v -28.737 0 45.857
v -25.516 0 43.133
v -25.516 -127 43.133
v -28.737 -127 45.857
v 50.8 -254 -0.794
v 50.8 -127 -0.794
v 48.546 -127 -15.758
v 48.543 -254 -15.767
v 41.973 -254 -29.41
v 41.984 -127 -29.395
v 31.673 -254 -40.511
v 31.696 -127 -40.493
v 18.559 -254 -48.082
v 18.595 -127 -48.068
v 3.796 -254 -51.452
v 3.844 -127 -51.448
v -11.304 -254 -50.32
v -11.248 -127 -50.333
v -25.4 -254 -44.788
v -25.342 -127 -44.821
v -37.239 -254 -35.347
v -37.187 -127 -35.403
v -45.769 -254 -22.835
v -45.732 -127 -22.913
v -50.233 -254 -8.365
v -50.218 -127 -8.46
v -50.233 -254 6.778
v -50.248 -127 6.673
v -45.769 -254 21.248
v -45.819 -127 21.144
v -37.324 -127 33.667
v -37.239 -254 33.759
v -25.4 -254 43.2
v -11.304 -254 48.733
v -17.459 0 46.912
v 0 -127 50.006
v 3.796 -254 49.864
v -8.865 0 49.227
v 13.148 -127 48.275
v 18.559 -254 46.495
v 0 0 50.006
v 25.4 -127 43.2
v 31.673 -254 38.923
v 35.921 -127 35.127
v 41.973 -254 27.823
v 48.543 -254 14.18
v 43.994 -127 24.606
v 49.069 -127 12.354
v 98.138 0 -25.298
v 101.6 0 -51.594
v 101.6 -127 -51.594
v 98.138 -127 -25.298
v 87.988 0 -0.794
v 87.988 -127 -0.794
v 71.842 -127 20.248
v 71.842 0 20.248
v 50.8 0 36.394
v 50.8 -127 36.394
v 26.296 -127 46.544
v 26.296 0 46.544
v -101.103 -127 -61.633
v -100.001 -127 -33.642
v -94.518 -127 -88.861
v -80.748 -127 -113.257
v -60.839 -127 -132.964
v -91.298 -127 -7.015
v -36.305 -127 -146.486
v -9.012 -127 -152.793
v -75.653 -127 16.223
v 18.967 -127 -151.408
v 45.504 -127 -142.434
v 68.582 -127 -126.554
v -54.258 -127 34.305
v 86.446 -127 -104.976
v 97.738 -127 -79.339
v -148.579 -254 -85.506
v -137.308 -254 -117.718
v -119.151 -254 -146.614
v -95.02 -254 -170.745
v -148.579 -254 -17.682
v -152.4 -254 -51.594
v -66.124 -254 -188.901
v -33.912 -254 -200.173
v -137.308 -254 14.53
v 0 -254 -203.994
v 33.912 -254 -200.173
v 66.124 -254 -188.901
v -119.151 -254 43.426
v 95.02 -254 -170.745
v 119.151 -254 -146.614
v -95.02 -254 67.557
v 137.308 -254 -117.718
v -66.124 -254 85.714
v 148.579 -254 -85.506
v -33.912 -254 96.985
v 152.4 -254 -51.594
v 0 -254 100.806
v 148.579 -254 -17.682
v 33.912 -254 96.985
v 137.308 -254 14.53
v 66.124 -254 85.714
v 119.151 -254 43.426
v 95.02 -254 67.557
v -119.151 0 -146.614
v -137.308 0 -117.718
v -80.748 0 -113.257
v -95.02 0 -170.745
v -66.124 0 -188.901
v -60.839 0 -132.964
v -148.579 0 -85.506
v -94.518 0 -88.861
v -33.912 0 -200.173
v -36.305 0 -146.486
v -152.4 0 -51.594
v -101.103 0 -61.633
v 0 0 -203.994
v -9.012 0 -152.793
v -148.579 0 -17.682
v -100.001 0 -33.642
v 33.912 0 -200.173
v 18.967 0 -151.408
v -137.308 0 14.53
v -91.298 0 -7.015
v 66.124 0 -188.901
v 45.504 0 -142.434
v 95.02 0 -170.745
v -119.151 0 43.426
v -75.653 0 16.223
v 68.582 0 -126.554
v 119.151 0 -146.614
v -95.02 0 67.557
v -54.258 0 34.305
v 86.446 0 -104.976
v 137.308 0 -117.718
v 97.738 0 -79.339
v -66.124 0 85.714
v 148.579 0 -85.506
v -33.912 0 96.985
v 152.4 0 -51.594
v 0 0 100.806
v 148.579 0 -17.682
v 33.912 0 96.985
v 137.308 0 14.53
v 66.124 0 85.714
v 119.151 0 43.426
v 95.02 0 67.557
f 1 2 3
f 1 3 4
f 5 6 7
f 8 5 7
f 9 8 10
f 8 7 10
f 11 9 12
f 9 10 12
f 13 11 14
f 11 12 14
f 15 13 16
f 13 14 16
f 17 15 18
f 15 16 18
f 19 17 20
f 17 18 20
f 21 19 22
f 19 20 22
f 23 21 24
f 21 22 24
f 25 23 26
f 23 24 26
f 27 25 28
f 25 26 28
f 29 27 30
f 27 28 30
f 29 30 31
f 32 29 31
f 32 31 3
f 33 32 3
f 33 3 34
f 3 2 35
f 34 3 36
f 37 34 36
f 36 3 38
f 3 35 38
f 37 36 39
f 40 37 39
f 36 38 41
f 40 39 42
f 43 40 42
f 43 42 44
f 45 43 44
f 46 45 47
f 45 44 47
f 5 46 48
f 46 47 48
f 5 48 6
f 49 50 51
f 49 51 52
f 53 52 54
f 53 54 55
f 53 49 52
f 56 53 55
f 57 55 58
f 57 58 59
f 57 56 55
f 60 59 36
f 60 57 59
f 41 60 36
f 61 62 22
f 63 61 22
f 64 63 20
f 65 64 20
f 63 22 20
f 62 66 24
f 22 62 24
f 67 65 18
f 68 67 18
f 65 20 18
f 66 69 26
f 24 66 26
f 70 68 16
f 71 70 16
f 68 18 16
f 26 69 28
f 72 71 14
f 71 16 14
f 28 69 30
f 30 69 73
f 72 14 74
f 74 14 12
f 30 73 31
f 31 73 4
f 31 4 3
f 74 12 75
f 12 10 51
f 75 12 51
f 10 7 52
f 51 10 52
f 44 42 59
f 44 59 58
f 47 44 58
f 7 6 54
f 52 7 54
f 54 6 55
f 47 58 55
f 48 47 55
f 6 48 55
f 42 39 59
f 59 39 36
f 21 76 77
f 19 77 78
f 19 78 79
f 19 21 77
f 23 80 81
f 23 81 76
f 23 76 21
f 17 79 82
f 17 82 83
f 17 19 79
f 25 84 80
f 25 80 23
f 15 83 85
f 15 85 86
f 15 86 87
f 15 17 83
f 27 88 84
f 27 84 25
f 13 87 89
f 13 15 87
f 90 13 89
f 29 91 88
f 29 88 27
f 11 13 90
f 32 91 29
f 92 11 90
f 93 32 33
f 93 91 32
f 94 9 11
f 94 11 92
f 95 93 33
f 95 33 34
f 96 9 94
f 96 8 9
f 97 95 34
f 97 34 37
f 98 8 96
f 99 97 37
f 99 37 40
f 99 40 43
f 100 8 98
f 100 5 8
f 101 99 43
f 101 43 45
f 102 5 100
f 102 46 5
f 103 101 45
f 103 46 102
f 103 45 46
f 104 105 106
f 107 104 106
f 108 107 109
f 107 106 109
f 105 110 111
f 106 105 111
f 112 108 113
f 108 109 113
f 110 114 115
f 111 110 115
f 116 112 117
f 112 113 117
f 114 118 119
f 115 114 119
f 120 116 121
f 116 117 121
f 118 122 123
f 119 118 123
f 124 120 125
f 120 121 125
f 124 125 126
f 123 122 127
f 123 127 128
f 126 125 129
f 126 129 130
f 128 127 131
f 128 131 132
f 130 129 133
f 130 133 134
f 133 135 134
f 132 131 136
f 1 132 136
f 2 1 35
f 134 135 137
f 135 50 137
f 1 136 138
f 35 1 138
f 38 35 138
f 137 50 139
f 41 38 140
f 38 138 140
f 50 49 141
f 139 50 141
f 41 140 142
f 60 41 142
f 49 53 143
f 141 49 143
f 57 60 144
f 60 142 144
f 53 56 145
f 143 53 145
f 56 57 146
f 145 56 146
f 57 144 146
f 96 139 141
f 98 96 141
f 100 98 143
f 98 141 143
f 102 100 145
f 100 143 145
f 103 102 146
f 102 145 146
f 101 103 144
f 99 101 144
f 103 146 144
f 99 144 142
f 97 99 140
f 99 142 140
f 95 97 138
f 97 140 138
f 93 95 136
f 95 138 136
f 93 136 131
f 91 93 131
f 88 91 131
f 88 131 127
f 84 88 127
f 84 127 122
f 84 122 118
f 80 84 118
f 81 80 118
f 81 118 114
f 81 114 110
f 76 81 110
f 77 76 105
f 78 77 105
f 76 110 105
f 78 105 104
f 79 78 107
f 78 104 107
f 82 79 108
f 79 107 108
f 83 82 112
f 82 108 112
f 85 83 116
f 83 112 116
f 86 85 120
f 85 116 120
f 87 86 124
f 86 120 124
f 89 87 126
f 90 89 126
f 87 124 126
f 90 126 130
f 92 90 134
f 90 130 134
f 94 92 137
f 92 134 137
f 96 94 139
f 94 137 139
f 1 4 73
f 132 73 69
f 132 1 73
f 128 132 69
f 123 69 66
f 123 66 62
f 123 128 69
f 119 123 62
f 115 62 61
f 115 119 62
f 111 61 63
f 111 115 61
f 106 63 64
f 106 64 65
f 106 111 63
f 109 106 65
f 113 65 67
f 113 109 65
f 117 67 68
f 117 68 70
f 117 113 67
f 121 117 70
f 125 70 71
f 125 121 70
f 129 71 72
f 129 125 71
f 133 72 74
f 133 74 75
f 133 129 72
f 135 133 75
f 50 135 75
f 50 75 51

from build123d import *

# Parameters (mm, degrees)
F0_R     = 152.4
F1_DEPTH = 254
F2_DEPTH = 127


with BuildPart() as f1:
    # F0 (on Front) → F1 (new body)
    with BuildSketch(Plane.XZ):
        with Locations((0, -51.59375)):
            Circle(F0_R)
        with BuildLine():
            ThreePointArc((-28.7373556529, 45.857388475), (-14.5176501359, 48.963685501), (0, 50.00625))
            ThreePointArc((0, 50.00625), (71.8420489686, 20.2482989686), (101.6, -51.59375))
            ThreePointArc((101.6, -51.59375), (-60.8393156835, -132.9641233995), (-28.7373556529, 45.857388475))
        make_face(mode=Mode.SUBTRACT)
        with BuildLine():
            Line((-28.7373556529, 45.857388475), (-25.5163285875, 43.1329727939))
            ThreePointArc((-25.5163285875, 43.1329727939), (-13.2129194743, 48.257842828), (0, 50.00625))
            ThreePointArc((0, 50.00625), (-14.5176501359, 48.963685501), (-28.7373556529, 45.857388475))
        make_face()
        with BuildLine():
            ThreePointArc((50.8, -0.79375), (-25.3417689572, -44.8214088762), (-25.5163285875, 43.1329727939))
            Line((-25.5163285875, 43.1329727939), (-28.7373556529, 45.857388475))
            ThreePointArc((-28.7373556529, 45.857388475), (-60.8393156835, -132.9641233995), (101.6, -51.59375))
            ThreePointArc((101.6, -51.59375), (71.8420489686, 20.2482989686), (0, 50.00625))
            ThreePointArc((0, 50.00625), (35.9210244843, 35.1272744843), (50.8, -0.79375))
        make_face()
    extrude(amount=F1_DEPTH)

    # F0 (on Front) → F2 (cut)
    with BuildSketch(Plane.XZ):
        with BuildLine():
            ThreePointArc((50.8, -0.79375), (-25.3417689572, -44.8214088762), (-25.5163285875, 43.1329727939))
            Line((-25.5163285875, 43.1329727939), (-28.7373556529, 45.857388475))
            ThreePointArc((-28.7373556529, 45.857388475), (-60.8393156835, -132.9641233995), (101.6, -51.59375))
            ThreePointArc((101.6, -51.59375), (71.8420489686, 20.2482989686), (0, 50.00625))
            ThreePointArc((0, 50.00625), (35.9210244843, 35.1272744843), (50.8, -0.79375))
        make_face()
    extrude(amount=F2_DEPTH, mode=Mode.SUBTRACT)


solid = f1.part
